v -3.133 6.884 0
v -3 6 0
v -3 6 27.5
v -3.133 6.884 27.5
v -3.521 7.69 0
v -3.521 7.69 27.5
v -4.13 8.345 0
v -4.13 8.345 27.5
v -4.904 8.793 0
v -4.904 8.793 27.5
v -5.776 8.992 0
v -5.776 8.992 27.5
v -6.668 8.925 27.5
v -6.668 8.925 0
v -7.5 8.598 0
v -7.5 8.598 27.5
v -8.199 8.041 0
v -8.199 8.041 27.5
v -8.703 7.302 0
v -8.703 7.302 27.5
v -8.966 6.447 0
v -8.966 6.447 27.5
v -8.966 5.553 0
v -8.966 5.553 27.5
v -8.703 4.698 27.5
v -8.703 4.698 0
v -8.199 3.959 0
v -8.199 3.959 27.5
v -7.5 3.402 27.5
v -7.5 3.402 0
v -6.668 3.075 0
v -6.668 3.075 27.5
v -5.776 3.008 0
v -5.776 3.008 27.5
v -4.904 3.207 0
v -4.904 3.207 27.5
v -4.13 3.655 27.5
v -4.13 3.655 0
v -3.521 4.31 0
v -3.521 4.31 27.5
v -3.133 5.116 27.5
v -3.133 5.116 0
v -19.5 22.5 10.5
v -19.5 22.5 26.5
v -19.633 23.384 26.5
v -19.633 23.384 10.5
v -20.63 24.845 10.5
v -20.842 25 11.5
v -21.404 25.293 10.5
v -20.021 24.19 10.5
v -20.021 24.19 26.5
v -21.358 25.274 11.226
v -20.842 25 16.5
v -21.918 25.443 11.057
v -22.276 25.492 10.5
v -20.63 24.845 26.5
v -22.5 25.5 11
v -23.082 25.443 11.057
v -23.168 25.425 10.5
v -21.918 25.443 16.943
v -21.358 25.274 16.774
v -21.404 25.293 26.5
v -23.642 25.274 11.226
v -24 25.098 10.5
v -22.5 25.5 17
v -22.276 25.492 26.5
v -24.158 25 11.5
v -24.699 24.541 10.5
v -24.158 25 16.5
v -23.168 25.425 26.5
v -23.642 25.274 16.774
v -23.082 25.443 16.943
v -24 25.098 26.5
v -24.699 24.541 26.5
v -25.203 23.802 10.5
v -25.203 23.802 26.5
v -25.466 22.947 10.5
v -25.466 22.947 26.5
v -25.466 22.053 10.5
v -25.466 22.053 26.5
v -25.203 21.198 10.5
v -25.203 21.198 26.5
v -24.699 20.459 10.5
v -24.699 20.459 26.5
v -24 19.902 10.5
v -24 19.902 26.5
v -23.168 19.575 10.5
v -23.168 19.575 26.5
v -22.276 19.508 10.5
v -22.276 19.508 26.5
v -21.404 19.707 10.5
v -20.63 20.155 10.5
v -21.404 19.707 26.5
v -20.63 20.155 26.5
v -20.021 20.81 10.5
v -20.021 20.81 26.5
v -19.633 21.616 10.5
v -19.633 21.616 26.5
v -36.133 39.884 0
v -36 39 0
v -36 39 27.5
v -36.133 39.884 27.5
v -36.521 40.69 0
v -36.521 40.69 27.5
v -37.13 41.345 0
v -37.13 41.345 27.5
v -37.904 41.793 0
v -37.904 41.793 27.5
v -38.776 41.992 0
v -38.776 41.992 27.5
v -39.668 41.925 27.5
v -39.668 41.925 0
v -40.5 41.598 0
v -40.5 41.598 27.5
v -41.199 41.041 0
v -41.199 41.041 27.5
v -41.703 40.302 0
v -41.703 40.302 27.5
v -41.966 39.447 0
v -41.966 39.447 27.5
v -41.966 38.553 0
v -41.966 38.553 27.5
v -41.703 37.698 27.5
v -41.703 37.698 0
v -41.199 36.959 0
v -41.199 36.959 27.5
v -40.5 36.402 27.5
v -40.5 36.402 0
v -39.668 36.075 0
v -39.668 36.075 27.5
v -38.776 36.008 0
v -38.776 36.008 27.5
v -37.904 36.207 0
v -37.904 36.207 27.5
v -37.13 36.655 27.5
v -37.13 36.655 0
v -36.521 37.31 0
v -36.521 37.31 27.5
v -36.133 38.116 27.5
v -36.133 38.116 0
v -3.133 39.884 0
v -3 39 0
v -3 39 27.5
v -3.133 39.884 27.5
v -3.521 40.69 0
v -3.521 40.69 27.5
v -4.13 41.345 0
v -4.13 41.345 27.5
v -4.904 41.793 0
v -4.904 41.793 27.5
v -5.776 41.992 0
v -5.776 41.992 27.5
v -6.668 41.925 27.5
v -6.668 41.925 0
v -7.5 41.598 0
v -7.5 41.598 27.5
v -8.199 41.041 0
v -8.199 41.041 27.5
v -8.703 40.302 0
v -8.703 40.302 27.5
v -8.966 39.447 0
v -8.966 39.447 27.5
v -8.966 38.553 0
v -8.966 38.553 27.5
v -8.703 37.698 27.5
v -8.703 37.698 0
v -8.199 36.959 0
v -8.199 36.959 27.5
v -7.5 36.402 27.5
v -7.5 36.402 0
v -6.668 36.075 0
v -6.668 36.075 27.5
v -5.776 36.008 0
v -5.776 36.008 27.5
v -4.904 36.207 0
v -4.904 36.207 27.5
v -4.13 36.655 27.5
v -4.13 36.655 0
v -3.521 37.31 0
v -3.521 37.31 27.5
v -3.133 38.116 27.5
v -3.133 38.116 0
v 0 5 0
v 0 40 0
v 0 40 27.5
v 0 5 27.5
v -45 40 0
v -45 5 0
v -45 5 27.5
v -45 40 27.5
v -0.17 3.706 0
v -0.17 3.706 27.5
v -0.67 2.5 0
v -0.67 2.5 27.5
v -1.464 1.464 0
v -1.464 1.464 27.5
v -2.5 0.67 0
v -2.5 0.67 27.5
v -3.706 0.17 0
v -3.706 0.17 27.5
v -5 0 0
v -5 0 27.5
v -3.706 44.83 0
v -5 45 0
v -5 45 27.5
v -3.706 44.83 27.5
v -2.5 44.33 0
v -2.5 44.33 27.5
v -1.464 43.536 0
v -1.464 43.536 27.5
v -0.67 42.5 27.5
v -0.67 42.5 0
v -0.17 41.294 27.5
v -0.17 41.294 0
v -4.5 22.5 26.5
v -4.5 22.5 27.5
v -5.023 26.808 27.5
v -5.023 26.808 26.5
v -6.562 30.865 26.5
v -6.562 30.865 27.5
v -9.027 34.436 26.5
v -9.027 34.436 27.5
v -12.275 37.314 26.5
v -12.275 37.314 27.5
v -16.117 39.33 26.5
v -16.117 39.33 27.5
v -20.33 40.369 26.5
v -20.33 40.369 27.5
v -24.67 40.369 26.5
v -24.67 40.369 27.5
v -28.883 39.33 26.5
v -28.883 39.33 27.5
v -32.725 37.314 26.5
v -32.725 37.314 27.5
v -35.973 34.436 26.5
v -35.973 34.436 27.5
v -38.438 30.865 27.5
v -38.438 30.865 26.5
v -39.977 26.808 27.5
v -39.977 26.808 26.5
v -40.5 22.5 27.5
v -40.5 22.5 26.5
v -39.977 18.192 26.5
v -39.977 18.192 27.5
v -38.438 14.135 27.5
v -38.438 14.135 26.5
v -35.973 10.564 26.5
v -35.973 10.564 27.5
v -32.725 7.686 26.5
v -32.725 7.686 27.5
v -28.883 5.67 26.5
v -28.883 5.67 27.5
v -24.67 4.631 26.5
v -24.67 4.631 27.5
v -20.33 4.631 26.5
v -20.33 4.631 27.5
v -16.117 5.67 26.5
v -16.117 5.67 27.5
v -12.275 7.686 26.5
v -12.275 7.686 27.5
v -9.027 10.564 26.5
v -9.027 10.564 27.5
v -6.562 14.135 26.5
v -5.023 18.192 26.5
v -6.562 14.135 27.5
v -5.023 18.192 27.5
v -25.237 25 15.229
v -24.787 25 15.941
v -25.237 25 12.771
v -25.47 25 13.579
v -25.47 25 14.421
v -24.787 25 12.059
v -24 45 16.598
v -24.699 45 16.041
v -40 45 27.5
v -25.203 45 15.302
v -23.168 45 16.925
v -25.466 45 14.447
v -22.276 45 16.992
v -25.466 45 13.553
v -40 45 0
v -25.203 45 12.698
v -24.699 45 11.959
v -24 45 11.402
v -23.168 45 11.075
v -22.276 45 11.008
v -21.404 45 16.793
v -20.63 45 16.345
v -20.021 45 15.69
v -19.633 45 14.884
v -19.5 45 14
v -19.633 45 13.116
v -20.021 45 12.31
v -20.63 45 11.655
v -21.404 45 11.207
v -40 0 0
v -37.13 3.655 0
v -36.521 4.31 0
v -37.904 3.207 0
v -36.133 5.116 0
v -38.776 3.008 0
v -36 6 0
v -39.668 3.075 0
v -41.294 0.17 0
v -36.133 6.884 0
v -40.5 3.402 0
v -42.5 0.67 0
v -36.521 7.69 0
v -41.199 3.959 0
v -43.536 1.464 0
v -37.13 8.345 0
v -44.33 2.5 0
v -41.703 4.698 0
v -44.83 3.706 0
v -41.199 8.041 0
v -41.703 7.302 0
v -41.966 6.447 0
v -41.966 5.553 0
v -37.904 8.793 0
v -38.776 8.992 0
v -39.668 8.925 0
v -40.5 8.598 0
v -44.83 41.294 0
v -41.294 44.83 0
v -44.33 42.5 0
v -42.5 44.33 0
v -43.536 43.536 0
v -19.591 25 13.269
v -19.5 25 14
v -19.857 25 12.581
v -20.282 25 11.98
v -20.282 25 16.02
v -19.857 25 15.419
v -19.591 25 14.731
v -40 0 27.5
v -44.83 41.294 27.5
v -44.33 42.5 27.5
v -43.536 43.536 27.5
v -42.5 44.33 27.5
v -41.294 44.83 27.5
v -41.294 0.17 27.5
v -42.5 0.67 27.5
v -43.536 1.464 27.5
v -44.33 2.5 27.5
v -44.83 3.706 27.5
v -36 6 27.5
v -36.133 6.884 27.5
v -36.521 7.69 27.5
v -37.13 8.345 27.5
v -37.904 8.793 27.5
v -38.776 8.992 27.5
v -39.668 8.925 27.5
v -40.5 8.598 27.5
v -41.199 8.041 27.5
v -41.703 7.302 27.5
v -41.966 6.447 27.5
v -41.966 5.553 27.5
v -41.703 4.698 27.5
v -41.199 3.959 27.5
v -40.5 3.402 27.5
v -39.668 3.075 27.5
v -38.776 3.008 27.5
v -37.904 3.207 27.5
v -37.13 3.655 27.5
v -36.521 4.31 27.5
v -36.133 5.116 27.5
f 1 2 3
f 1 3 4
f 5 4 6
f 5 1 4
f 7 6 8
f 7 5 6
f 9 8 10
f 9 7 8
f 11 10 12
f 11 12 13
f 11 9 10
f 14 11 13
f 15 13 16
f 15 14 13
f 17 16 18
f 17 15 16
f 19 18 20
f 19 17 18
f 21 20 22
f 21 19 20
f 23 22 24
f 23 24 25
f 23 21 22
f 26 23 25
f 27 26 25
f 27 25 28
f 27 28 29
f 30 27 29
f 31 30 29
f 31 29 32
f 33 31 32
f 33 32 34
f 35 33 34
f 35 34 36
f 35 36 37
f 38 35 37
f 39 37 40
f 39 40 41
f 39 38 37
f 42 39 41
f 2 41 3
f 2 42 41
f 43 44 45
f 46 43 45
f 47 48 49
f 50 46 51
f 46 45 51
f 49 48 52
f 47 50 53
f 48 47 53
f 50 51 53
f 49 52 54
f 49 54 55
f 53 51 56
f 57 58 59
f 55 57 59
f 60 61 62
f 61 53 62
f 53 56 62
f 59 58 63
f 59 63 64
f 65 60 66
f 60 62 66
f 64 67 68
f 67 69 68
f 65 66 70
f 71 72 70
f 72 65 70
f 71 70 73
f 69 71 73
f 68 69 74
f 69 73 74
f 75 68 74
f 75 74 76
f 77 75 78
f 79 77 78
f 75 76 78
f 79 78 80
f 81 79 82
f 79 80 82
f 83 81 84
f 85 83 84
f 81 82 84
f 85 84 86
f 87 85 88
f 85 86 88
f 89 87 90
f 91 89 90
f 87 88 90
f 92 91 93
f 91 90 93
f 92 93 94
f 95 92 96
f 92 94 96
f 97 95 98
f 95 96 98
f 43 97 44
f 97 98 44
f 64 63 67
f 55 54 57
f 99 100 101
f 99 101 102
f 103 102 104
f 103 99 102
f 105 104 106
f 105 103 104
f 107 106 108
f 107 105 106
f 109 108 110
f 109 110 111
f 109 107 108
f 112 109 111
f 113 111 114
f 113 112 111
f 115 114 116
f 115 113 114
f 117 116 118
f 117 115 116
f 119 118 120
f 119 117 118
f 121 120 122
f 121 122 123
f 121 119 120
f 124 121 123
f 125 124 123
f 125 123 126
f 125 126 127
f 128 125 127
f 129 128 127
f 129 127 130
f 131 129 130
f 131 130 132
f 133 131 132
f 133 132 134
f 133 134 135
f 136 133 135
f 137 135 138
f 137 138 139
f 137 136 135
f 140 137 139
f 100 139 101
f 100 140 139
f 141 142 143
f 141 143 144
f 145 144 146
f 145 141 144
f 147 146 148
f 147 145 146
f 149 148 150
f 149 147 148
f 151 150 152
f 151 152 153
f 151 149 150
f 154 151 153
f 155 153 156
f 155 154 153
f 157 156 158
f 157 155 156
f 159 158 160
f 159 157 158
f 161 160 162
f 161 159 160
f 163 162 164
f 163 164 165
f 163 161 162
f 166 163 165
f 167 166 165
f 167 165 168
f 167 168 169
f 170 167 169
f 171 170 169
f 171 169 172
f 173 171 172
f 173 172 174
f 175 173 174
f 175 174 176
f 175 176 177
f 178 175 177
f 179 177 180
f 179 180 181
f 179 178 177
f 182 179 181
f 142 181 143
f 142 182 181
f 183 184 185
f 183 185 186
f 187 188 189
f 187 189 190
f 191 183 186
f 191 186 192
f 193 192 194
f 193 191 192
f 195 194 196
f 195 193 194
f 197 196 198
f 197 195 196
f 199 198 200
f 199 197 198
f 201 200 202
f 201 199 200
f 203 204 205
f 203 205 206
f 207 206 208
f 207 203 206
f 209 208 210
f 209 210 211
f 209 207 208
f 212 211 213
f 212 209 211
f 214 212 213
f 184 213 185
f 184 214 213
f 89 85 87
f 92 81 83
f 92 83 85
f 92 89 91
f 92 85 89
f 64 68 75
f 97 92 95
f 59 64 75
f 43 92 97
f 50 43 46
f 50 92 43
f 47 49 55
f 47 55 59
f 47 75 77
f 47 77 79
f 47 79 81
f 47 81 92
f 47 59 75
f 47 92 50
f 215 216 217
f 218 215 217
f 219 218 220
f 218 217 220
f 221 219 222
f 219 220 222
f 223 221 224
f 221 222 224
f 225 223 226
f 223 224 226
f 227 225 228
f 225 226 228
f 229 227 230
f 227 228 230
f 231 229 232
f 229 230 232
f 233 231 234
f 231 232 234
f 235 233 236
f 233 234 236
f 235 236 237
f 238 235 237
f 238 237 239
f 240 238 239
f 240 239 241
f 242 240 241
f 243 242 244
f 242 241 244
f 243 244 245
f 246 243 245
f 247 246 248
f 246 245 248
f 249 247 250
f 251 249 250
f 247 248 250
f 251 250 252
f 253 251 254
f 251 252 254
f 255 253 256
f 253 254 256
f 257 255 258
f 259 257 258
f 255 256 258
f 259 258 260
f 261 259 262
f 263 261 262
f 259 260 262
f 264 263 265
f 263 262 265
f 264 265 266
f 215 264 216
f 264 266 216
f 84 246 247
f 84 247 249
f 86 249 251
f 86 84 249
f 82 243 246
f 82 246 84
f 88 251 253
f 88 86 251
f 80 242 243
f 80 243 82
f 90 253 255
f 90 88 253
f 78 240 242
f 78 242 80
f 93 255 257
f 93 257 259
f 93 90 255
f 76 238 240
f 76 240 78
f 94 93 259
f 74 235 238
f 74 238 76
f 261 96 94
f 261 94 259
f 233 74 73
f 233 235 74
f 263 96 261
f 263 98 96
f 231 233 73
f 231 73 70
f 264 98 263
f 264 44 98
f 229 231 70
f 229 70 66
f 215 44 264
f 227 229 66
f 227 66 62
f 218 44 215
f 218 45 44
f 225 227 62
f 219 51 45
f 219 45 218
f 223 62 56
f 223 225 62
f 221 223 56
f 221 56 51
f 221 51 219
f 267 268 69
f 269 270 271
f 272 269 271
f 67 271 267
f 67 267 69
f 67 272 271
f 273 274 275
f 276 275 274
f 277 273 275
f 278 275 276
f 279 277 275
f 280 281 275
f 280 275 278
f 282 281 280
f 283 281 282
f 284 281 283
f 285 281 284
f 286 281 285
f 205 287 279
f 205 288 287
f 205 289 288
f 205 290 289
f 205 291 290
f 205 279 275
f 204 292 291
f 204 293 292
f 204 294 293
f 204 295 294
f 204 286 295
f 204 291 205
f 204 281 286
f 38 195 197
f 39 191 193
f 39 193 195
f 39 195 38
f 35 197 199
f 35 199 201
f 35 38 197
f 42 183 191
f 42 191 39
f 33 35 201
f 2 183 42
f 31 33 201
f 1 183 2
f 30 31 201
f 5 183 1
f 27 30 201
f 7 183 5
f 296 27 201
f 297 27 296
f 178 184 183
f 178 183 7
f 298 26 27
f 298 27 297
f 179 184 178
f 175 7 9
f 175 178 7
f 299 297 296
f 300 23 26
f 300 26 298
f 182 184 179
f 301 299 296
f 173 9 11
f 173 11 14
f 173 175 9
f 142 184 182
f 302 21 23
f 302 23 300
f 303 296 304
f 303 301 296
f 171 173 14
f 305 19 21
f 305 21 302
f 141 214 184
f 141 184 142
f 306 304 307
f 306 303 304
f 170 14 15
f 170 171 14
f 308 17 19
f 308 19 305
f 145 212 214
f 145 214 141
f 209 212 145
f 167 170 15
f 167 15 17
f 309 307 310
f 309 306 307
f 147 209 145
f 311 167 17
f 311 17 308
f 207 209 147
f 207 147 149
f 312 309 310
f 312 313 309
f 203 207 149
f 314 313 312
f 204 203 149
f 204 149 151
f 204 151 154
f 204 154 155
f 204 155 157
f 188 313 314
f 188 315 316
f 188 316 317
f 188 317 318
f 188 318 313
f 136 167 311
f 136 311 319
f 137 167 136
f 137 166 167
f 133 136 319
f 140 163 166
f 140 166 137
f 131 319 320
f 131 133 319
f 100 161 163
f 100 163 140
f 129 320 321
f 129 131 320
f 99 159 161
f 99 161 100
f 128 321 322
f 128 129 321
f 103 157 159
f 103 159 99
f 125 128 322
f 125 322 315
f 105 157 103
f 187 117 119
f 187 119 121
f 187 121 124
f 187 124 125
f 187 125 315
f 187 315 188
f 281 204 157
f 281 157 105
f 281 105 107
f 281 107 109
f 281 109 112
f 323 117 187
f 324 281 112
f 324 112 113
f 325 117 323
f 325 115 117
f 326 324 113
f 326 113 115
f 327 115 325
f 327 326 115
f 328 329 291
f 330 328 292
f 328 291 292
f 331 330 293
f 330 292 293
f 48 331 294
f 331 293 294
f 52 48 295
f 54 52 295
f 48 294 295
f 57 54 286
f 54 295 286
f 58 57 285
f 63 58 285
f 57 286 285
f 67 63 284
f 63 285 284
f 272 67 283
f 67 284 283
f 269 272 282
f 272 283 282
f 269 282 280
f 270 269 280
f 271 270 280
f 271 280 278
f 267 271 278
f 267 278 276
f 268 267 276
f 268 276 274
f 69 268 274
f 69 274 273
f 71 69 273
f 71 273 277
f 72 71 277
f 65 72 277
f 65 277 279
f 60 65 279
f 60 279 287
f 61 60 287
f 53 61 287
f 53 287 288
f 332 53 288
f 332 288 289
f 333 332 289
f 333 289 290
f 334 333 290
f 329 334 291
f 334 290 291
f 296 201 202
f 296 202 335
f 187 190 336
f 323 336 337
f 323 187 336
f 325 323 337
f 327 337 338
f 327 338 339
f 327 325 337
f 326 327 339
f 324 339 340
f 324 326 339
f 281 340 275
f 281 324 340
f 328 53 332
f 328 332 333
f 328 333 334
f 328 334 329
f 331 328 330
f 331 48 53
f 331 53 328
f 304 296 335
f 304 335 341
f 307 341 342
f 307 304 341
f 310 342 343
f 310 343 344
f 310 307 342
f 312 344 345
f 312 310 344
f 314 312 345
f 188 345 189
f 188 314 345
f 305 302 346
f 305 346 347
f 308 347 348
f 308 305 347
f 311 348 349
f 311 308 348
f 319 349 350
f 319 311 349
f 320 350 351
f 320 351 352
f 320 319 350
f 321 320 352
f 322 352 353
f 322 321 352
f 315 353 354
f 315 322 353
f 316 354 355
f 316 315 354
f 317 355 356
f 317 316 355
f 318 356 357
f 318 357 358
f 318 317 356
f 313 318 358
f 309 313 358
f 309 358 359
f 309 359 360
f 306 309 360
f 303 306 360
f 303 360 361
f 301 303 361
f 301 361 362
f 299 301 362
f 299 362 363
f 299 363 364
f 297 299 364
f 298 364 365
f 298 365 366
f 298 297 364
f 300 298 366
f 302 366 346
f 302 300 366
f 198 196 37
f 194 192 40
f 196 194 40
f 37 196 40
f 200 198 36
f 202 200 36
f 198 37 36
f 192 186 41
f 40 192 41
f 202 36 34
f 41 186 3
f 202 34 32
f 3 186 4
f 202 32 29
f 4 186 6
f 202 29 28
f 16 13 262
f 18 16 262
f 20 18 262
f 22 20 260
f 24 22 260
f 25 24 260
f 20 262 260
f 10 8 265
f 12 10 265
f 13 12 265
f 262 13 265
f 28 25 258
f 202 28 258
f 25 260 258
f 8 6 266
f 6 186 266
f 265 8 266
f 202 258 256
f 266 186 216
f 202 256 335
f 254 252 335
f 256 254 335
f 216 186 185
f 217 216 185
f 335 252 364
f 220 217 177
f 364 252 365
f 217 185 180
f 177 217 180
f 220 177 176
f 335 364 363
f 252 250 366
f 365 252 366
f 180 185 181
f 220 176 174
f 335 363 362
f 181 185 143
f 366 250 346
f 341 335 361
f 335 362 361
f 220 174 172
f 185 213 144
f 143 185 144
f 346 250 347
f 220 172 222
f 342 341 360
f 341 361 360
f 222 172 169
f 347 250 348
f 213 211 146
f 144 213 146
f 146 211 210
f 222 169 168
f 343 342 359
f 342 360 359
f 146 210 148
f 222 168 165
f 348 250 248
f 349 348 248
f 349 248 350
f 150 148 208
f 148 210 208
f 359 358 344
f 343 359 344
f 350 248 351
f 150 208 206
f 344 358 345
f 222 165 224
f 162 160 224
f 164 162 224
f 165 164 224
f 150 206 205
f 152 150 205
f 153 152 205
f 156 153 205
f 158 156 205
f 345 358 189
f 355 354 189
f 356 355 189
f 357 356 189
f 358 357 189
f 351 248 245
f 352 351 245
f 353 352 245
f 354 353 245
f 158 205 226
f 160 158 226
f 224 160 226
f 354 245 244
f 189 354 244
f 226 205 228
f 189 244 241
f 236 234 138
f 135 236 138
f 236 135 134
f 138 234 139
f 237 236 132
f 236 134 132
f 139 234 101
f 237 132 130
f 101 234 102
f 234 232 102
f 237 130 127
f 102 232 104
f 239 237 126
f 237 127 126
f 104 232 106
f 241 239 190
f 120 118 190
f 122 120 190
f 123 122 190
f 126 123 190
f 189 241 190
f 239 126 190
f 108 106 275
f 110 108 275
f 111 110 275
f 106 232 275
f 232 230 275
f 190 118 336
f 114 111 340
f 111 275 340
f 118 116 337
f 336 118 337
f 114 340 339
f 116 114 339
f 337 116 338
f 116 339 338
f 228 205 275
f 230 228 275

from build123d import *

# Parameters (mm, degrees)
SKETCH1_R           = 3
BOSS_EXTRUDE1_DEPTH = 27.5
SKETCH3_R           = 18
CUT_EXTRUDE1_DEPTH  = 1
SKETCH7_R           = 3
CUT_EXTRUDE2_DEPTH  = 20
SKETCH8_R           = 3
CUT_EXTRUDE3_DEPTH  = 16


with BuildPart() as part:
    # Sketch1 → Boss-Extrude1 (new body)
    with BuildSketch(Plane.XY):
        with BuildLine():
            Line((0, 40), (0, 5))
            ThreePointArc((0, 5), (-1.464466094, 1.464466094), (-5, 0))
            Line((-5, 0), (-40, 0))
            ThreePointArc((-40, 0), (-43.535533906, 1.464466094), (-45, 5))
            Line((-45, 5), (-45, 40))
            ThreePointArc((-45, 40), (-43.535533906, 43.535533906), (-40, 45))
            Line((-40, 45), (-5, 45))
            ThreePointArc((-5, 45), (-1.464466094, 43.535533906), (0, 40))
        make_face()
        with Locations((-6, 39)):
            Circle(SKETCH1_R, mode=Mode.SUBTRACT)
        with Locations((-6, 6)):
            Circle(SKETCH1_R, mode=Mode.SUBTRACT)
        with Locations((-39, 6)):
            Circle(SKETCH1_R, mode=Mode.SUBTRACT)
        with Locations((-39, 39)):
            Circle(SKETCH1_R, mode=Mode.SUBTRACT)
    extrude(amount=BOSS_EXTRUDE1_DEPTH)

    # Sketch3 → Cut-Extrude1 (cut)
    with BuildSketch(Plane.XY.offset(27.5)):
        with Locations((-22.5, 22.5)):
            Circle(SKETCH3_R)
    extrude(amount=-CUT_EXTRUDE1_DEPTH, mode=Mode.SUBTRACT)

    # Sketch7 → Cut-Extrude2 (cut)
    with BuildSketch(Plane(origin=(0, 45, 0), x_dir=(1, 0, 0), z_dir=(0, 1, 0))):
        with Locations((-22.5, -14)):
            Circle(SKETCH7_R)
    extrude(amount=-CUT_EXTRUDE2_DEPTH, mode=Mode.SUBTRACT)

    # Sketch8 → Cut-Extrude3 (cut)
    with BuildSketch(Plane.XY.offset(26.5)):
        with Locations((-22.5, 22.5)):
            Circle(SKETCH8_R)
    extrude(amount=-CUT_EXTRUDE3_DEPTH, mode=Mode.SUBTRACT)


solid = part.part
